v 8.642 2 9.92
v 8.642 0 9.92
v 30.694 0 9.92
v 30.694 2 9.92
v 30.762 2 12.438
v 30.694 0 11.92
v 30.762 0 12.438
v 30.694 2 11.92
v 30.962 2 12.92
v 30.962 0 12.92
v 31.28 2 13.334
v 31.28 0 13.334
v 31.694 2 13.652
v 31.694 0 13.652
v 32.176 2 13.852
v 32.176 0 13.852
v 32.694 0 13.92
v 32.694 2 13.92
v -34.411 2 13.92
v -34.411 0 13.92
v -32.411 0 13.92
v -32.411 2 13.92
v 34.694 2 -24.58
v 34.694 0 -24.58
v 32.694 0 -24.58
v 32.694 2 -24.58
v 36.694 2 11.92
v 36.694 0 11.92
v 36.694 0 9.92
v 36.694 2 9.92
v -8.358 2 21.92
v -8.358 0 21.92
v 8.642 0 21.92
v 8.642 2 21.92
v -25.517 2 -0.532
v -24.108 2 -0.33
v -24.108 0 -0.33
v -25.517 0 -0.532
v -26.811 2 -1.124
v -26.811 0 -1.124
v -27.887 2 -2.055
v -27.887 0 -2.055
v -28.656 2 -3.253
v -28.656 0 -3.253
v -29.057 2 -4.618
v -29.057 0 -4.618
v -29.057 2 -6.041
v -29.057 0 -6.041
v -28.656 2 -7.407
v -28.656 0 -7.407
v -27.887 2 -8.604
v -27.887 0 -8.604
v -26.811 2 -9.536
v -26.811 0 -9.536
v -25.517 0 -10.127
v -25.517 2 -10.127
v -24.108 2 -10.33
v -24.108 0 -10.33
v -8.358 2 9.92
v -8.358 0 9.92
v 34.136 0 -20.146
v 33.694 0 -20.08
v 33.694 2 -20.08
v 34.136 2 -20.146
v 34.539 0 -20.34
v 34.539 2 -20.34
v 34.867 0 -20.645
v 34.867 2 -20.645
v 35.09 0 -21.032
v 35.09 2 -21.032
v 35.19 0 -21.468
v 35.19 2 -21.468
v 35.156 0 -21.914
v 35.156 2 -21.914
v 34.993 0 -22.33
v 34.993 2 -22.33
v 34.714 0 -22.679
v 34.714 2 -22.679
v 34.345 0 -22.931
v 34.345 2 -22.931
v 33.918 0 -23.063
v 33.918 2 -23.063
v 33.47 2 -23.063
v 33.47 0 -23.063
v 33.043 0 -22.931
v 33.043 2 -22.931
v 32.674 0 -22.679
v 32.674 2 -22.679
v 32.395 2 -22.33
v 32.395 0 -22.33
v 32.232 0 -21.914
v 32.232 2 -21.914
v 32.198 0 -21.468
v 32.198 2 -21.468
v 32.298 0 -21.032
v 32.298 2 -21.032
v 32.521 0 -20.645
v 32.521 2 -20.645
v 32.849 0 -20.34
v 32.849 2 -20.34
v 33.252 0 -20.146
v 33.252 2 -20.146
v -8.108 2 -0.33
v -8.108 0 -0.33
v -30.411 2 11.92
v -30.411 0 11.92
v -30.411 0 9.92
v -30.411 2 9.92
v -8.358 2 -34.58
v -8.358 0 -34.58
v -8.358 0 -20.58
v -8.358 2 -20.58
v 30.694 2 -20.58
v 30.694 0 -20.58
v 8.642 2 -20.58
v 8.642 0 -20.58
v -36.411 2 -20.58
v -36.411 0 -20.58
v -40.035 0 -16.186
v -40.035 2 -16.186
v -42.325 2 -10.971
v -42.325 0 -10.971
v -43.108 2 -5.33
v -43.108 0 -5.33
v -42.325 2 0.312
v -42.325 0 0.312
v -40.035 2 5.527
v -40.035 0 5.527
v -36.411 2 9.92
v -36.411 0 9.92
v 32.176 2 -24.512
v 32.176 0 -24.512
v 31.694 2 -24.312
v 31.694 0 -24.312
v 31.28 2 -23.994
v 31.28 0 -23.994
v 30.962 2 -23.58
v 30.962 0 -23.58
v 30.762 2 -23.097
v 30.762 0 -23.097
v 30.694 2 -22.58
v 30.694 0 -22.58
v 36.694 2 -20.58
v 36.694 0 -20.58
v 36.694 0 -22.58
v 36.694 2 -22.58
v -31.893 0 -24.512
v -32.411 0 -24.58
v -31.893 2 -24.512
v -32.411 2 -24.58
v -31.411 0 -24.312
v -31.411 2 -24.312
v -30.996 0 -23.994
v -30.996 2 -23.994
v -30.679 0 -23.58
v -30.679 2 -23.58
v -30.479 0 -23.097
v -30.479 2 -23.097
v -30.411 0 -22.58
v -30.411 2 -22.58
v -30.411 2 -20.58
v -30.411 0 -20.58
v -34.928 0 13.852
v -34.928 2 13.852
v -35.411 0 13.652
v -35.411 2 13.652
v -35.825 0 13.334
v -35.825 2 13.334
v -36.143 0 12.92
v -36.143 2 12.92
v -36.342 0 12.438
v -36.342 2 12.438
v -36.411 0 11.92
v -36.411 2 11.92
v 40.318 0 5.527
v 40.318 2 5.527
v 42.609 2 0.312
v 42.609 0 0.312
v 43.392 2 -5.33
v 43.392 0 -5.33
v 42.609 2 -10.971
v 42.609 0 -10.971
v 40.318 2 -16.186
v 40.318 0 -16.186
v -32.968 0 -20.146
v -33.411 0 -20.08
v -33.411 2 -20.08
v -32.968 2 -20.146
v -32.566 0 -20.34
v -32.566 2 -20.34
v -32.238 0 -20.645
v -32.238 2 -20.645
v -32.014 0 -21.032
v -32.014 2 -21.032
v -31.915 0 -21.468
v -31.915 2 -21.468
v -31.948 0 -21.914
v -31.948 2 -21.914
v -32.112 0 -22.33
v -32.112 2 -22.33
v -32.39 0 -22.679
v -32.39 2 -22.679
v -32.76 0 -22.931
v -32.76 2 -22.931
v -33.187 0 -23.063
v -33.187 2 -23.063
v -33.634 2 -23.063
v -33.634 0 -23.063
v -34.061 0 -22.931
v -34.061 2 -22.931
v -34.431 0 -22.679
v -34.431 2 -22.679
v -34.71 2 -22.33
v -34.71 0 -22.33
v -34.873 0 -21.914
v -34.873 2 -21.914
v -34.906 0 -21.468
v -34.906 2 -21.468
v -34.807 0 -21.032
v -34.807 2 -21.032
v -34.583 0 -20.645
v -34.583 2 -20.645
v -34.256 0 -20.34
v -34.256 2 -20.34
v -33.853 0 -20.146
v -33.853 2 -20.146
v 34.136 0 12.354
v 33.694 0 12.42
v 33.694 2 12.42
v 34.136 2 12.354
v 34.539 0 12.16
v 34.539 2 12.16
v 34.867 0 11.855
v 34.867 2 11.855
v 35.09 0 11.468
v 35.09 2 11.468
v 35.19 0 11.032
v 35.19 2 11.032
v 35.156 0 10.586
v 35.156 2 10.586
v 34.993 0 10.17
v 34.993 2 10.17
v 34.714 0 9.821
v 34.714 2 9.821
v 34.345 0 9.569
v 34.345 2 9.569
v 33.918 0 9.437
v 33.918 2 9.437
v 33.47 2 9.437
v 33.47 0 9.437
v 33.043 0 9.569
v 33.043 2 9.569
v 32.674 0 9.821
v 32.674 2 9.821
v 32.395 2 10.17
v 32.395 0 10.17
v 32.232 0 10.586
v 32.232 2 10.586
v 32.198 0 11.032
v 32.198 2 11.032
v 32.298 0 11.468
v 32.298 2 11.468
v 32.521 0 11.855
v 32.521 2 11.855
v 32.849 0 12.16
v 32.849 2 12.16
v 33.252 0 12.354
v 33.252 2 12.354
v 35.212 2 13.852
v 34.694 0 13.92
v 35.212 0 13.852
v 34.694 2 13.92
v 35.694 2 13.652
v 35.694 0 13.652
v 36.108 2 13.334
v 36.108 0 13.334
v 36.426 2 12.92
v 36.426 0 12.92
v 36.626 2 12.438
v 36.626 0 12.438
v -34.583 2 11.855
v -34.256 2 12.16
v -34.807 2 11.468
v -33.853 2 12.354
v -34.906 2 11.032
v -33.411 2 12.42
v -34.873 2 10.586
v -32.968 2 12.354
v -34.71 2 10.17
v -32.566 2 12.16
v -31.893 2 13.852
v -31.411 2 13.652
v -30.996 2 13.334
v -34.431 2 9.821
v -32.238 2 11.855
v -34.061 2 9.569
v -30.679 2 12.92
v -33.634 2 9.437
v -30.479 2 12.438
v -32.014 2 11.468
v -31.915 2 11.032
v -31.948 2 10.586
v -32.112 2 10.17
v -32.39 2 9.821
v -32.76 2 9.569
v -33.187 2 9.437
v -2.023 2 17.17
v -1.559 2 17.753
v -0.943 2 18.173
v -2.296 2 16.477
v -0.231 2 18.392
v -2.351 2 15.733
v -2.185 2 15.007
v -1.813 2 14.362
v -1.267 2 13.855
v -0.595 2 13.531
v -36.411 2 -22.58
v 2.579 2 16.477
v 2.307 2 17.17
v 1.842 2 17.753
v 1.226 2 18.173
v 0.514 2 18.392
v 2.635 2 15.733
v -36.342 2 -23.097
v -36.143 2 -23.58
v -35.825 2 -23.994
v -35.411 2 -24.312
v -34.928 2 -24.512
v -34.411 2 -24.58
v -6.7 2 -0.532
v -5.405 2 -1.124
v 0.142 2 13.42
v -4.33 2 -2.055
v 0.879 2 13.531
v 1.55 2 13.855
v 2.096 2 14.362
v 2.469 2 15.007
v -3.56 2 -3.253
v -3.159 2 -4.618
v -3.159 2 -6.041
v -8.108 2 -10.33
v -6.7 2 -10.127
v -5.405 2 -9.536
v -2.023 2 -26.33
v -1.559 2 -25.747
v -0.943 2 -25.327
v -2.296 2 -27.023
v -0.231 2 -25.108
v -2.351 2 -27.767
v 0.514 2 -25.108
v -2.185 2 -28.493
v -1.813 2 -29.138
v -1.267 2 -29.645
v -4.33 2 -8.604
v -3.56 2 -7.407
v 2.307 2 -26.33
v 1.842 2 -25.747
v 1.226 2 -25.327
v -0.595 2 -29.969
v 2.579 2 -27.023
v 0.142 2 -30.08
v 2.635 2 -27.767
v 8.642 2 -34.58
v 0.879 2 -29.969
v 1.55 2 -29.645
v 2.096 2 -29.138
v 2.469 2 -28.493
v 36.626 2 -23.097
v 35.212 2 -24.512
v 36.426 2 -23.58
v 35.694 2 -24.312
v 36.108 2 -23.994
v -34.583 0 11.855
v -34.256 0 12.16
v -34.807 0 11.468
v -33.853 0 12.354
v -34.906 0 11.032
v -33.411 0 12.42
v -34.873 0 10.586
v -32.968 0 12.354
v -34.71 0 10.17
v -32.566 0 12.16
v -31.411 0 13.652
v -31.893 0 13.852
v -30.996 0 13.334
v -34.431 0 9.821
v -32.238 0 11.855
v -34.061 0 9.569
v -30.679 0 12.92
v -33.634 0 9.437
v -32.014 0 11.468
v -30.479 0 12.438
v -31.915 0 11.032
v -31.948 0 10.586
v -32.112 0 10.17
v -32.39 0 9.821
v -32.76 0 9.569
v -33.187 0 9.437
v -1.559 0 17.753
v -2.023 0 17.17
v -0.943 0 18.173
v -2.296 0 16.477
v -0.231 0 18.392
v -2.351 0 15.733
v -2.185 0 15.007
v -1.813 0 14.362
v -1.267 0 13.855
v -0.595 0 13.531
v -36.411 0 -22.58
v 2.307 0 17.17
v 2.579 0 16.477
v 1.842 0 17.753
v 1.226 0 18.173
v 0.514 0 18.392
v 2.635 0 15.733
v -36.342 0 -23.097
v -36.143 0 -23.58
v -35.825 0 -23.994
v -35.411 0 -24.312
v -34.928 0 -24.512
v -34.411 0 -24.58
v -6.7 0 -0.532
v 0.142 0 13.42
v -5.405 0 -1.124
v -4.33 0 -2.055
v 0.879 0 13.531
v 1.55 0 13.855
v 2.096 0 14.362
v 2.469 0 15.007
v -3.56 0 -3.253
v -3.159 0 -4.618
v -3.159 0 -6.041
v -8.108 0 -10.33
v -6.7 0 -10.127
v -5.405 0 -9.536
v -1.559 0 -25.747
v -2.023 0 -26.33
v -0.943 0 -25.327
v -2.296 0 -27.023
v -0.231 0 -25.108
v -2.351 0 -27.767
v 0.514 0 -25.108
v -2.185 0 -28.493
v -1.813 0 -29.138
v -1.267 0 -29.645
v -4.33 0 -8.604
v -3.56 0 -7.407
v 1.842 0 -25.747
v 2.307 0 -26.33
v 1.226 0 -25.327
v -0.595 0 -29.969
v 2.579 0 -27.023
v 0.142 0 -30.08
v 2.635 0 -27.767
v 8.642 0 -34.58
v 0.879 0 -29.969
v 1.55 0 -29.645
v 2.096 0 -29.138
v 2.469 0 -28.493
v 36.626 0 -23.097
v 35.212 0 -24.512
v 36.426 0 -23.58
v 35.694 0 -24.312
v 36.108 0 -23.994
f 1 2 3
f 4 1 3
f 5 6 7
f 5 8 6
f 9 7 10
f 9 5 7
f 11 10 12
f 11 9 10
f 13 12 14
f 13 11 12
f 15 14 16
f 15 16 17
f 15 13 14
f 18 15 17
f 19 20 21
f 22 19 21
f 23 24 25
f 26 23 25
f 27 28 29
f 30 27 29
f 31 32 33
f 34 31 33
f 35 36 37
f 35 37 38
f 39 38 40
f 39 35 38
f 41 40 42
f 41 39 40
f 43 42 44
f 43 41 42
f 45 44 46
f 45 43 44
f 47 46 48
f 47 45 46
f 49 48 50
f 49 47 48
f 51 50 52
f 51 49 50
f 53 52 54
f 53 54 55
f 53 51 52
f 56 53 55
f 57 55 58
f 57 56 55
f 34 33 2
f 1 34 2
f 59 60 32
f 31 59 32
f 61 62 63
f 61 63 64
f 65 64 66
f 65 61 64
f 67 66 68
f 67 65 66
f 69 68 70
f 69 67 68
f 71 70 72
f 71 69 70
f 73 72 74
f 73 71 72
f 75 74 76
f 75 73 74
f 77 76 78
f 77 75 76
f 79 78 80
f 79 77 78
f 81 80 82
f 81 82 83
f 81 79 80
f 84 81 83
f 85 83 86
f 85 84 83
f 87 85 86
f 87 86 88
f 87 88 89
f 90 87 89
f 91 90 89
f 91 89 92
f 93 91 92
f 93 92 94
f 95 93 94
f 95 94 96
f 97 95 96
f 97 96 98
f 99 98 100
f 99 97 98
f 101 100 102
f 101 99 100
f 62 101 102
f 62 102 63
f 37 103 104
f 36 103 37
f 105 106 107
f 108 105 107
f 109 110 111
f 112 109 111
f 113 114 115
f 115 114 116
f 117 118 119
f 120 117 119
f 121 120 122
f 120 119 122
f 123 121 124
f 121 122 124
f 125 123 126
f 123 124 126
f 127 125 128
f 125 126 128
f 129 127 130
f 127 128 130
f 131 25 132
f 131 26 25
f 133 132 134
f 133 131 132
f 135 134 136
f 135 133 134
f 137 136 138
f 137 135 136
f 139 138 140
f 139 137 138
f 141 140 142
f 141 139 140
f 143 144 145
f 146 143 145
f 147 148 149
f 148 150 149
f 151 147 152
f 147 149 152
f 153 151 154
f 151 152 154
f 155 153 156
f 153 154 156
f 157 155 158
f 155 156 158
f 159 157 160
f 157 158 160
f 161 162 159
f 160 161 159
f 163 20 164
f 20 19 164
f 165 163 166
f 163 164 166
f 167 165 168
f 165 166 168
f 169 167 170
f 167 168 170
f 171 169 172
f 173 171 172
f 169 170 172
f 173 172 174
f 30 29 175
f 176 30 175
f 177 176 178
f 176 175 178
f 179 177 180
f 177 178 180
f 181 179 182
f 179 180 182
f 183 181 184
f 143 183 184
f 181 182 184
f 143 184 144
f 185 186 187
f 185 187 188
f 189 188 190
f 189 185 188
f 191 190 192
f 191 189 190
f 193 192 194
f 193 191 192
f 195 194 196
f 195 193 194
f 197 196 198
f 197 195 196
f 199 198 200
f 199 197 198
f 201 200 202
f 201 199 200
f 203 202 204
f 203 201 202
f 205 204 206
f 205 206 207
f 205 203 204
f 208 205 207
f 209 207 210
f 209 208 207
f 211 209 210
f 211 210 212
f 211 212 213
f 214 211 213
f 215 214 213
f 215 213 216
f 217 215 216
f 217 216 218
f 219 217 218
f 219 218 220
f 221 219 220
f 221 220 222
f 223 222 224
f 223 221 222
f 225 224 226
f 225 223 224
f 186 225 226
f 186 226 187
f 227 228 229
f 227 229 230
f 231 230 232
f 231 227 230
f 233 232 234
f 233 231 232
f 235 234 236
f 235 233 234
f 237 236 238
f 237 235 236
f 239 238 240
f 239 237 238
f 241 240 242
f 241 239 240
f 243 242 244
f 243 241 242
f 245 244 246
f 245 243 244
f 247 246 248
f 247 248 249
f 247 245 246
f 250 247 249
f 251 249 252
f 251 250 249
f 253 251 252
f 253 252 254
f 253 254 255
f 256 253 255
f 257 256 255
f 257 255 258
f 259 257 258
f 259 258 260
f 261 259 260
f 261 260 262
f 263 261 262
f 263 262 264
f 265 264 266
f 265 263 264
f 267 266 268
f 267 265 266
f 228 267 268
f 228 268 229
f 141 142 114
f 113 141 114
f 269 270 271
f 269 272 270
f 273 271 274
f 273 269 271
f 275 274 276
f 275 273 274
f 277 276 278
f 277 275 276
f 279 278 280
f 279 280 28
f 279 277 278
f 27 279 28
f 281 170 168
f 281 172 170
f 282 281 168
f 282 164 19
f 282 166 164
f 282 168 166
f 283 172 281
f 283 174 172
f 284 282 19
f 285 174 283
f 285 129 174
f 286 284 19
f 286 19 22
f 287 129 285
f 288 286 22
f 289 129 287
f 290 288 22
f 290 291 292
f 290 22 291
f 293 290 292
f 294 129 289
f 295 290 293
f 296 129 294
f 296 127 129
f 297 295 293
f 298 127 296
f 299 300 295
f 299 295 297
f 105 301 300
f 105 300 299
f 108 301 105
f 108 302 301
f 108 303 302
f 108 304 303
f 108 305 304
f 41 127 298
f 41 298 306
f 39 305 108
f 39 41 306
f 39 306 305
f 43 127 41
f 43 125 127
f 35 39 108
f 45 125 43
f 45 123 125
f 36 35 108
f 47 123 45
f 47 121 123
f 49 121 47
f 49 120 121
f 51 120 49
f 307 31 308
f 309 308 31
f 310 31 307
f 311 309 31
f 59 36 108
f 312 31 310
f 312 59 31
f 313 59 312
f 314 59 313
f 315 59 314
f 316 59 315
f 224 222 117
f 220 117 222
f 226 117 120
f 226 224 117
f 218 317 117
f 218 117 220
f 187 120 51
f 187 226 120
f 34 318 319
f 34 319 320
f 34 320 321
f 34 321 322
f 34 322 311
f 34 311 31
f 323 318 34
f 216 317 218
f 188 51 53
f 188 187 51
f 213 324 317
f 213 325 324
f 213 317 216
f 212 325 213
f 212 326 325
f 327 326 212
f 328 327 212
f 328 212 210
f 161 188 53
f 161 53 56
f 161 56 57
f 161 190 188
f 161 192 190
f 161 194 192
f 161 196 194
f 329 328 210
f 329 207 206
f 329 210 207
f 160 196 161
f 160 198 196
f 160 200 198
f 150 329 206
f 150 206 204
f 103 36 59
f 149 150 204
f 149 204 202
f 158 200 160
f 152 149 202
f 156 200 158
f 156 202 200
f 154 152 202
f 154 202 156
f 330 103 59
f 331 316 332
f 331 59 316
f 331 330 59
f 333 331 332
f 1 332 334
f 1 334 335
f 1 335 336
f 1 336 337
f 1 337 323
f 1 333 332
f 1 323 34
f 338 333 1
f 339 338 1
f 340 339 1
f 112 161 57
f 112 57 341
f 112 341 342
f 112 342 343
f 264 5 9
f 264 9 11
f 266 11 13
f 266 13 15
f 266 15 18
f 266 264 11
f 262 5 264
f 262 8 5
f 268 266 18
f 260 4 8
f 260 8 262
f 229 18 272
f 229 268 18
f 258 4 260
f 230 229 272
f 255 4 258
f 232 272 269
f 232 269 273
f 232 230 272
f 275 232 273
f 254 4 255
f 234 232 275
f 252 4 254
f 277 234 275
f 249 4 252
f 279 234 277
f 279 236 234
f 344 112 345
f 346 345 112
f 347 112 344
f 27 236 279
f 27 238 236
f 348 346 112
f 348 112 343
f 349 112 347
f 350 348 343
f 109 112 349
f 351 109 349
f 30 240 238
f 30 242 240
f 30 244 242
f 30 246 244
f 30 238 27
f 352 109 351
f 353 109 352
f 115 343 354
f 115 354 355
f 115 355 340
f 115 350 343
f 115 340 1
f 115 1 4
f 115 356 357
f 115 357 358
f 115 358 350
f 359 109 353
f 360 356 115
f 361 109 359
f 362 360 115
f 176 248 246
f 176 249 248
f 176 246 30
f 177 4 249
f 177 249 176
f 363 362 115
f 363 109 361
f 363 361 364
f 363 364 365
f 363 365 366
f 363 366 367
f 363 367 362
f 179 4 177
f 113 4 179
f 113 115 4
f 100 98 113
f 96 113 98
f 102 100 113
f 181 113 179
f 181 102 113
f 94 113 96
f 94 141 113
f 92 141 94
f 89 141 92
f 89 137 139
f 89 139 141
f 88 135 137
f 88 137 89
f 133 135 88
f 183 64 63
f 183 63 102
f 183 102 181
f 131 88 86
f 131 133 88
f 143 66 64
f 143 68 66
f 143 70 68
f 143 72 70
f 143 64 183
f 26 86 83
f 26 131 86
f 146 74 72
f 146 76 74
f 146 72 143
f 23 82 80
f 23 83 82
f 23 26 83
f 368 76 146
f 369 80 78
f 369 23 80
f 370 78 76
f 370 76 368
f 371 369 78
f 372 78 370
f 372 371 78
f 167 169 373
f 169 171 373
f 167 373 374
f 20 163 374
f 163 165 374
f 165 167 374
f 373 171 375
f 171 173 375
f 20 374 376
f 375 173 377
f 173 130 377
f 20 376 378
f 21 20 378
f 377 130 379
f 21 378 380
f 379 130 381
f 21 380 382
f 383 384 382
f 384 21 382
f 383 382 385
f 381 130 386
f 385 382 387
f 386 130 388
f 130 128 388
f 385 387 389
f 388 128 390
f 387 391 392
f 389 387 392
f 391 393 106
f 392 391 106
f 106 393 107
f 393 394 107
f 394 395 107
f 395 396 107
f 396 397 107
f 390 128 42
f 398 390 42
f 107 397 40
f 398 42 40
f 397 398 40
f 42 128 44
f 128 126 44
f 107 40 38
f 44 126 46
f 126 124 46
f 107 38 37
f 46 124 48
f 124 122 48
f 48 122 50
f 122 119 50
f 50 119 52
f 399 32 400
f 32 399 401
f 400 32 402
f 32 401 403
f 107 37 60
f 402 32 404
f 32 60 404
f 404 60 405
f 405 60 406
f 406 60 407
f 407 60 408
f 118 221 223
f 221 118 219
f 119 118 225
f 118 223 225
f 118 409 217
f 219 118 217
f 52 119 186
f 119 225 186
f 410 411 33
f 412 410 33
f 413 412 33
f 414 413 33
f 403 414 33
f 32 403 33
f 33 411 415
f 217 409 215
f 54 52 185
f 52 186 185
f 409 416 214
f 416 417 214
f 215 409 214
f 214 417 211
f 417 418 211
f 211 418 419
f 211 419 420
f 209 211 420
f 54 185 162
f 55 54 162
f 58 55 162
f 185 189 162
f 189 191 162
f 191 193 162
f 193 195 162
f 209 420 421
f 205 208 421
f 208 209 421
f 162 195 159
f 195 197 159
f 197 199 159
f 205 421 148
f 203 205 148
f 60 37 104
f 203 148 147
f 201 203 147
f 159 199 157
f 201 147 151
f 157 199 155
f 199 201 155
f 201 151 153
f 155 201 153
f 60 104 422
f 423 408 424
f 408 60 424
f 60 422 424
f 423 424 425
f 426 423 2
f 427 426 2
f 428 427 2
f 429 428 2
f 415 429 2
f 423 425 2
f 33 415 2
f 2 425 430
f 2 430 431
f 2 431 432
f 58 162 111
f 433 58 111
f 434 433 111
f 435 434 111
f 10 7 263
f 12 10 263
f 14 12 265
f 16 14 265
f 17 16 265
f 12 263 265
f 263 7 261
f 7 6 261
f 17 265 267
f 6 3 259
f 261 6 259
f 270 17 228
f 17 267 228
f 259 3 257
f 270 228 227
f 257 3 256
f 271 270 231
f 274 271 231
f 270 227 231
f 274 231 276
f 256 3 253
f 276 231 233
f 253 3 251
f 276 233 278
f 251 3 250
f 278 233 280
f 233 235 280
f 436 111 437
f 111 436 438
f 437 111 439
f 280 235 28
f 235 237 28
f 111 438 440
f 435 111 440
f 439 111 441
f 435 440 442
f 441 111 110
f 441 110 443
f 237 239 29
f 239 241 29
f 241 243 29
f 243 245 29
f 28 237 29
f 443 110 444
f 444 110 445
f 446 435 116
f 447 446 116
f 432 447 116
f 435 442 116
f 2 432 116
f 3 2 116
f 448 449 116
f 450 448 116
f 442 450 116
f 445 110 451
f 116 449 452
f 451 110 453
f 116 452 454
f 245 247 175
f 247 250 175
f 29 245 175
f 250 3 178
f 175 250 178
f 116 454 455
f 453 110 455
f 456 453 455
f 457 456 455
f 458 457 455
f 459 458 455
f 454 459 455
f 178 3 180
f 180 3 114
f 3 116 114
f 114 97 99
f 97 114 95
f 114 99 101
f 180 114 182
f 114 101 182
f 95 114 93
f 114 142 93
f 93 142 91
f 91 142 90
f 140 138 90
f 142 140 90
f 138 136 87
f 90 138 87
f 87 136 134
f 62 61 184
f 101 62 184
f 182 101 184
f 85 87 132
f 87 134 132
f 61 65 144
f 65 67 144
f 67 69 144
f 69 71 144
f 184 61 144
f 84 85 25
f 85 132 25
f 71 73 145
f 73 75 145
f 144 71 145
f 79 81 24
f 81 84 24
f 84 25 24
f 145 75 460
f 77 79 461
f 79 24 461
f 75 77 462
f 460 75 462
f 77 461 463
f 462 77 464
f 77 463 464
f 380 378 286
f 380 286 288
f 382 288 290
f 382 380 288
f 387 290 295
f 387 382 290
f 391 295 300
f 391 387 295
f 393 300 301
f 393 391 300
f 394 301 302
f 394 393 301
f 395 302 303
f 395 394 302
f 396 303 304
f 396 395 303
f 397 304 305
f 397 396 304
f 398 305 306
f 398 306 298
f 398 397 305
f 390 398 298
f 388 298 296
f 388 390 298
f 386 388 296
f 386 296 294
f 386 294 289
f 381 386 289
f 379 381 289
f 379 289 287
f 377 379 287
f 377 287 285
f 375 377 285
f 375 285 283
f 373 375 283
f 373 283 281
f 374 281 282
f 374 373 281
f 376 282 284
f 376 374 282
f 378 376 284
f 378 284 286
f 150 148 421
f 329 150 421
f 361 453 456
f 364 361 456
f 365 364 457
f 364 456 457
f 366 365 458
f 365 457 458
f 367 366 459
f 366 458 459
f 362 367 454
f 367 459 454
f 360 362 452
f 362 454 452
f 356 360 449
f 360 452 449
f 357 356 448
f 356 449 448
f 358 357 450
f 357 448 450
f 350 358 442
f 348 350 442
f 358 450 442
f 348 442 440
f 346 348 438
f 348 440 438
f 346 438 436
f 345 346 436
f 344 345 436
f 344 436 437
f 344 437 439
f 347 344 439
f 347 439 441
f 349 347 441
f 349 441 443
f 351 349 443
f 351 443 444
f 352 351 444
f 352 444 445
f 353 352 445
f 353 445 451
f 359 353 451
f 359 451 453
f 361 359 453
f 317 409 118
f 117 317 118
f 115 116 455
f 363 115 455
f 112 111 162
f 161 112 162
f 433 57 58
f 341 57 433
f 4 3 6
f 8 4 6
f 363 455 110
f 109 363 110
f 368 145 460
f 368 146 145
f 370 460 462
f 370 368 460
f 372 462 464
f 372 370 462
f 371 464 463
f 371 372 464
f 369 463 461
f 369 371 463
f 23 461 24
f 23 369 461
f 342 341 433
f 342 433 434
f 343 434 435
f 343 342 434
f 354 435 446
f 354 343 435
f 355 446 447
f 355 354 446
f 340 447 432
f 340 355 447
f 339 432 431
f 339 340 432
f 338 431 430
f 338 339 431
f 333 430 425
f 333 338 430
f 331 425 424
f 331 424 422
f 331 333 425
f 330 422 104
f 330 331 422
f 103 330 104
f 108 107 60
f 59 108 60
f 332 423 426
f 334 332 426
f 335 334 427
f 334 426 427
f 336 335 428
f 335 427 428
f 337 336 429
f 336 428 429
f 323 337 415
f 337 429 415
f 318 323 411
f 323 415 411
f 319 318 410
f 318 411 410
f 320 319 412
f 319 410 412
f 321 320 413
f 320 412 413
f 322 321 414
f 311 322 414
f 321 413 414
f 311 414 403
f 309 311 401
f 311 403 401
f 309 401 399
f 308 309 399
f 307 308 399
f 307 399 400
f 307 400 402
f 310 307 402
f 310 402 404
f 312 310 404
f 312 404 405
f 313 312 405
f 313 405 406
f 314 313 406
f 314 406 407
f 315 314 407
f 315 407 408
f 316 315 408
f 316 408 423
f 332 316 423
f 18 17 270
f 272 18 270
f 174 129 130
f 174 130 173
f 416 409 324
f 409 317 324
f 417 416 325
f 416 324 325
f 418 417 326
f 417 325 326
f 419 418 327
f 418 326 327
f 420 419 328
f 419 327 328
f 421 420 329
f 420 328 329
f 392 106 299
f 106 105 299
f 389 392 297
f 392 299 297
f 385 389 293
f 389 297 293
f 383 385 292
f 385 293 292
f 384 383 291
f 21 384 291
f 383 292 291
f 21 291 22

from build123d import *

# Parameters (mm, degrees)
SKETCH1_R           = 1.5
BOSS_EXTRUDE1_DEPTH = 2
CUT_EXTRUDE1_DEPTH  = 2
FILLET1_R           = 2
SKETCH3_R           = 2.5
CUT_EXTRUDE2_DEPTH  = 10


with BuildPart() as part:
    # Sketch1 → Boss-Extrude1 (new body)
    with BuildSketch(Plane(origin=(0, 0, 0), x_dir=(1, 0, 0), z_dir=(0, 1, 0))):
        with BuildLine():
            Line((8.64173402, -21.920230415), (8.64173402, -9.920230415))
            Line((8.64173402, -9.920230415), (30.694037343, -9.920230415))
            Line((30.694037343, -9.920230415), (30.694037343, -13.920230415))
            Line((30.694037343, -13.920230415), (36.694037343, -13.920230415))
            Line((36.694037343, -13.920230415), (36.694037343, -9.920230415))
            ThreePointArc((36.694037343, -9.920230415), (43.39173402, 5.329769585), (36.694037343, 20.579769585))
            Line((36.694037343, 20.579769585), (36.694037343, 24.579769585))
            Line((36.694037343, 24.579769585), (30.694037343, 24.579769585))
            Line((30.694037343, 24.579769585), (30.694037343, 20.579769585))
            Line((30.694037343, 20.579769585), (8.64173402, 20.579769585))
            Line((8.64173402, 20.579769585), (8.64173402, 34.579769585))
            Line((8.64173402, 34.579769585), (-8.35826598, 34.579769585))
            Line((-8.35826598, 34.579769585), (-8.35826598, 20.579769585))
            Line((-8.35826598, 20.579769585), (-30.410569302, 20.579769585))
            Line((-30.410569302, 20.579769585), (-30.410569302, 24.579769585))
            Line((-30.410569302, 24.579769585), (-36.410569302, 24.579769585))
            Line((-36.410569302, 24.579769585), (-36.410569302, 20.579769585))
            ThreePointArc((-36.410569302, 20.579769585), (-43.10826598, 5.329769585), (-36.410569302, -9.920230415))
            Line((-36.410569302, -9.920230415), (-36.410569302, -13.920230415))
            Line((-36.410569302, -13.920230415), (-30.410569302, -13.920230415))
            Line((-30.410569302, -13.920230415), (-30.410569302, -9.920230415))
            Line((-30.410569302, -9.920230415), (-8.35826598, -9.920230415))
            Line((-8.35826598, -9.920230415), (-8.35826598, -21.920230415))
            Line((-8.35826598, -21.920230415), (8.64173402, -21.920230415))
        make_face()
        with Locations(Location((-33.410569302, 21.579769585, 0), (0, 0, 270))):
            Circle(SKETCH1_R, mode=Mode.SUBTRACT)
        with Locations(Location((-33.410569302, -10.920230415, 0), (0, 0, 270))):
            Circle(SKETCH1_R, mode=Mode.SUBTRACT)
        with Locations(Location((33.694037343, -10.920230415, 0), (0, 0, 270))):
            Circle(SKETCH1_R, mode=Mode.SUBTRACT)
        with Locations(Location((33.694037343, 21.579769585, 0), (0, 0, 270))):
            Circle(SKETCH1_R, mode=Mode.SUBTRACT)
    extrude(amount=BOSS_EXTRUDE1_DEPTH)

    # Sketch2 → Cut-Extrude1 (cut)
    with BuildSketch(Plane(origin=(0, 2, 0), x_dir=(1, 0, 0), z_dir=(0, 1, 0))):
        with BuildLine():
            Line((-24.10826598, 10.329769585), (-8.10826598, 10.329769585))
            ThreePointArc((-8.10826598, 10.329769585), (-3.10826598, 5.329769585), (-8.10826598, 0.329769585))
            Line((-8.10826598, 0.329769585), (-24.10826598, 0.329769585))
            ThreePointArc((-24.10826598, 0.329769585), (-29.10826598, 5.329769585), (-24.10826598, 10.329769585))
        make_face()
    extrude(amount=-CUT_EXTRUDE1_DEPTH, mode=Mode.SUBTRACT)

    # Fillet1
    fillet1_edges = [part.edges().sort_by_distance(p)[0] for p in [
        (-30.410569302, 1, 13.920230415),
        (-36.410569302, 1, 13.920230415),
        (-36.410569302, 1, -24.579769585),
        (-30.410569302, 1, -24.579769585),
        (30.694037343, 1, -24.579769585),
        (36.694037343, 1, -24.579769585),
        (36.694037343, 1, 13.920230415),
        (30.694037343, 1, 13.920230415),
    ]]
    fillet(fillet1_edges, radius=FILLET1_R)

    # Sketch3 → Cut-Extrude2 (cut)
    with BuildSketch(Plane.XZ):
        with Locations(Location((0.14173402, -27.579769585, 0), (0, 0, 270))):
            Circle(SKETCH3_R)
        with Locations(Location((0.14173402, 15.920230415, 0), (0, 0, 270))):
            Circle(SKETCH3_R)
    extrude(amount=-CUT_EXTRUDE2_DEPTH, mode=Mode.SUBTRACT)


solid = part.part
